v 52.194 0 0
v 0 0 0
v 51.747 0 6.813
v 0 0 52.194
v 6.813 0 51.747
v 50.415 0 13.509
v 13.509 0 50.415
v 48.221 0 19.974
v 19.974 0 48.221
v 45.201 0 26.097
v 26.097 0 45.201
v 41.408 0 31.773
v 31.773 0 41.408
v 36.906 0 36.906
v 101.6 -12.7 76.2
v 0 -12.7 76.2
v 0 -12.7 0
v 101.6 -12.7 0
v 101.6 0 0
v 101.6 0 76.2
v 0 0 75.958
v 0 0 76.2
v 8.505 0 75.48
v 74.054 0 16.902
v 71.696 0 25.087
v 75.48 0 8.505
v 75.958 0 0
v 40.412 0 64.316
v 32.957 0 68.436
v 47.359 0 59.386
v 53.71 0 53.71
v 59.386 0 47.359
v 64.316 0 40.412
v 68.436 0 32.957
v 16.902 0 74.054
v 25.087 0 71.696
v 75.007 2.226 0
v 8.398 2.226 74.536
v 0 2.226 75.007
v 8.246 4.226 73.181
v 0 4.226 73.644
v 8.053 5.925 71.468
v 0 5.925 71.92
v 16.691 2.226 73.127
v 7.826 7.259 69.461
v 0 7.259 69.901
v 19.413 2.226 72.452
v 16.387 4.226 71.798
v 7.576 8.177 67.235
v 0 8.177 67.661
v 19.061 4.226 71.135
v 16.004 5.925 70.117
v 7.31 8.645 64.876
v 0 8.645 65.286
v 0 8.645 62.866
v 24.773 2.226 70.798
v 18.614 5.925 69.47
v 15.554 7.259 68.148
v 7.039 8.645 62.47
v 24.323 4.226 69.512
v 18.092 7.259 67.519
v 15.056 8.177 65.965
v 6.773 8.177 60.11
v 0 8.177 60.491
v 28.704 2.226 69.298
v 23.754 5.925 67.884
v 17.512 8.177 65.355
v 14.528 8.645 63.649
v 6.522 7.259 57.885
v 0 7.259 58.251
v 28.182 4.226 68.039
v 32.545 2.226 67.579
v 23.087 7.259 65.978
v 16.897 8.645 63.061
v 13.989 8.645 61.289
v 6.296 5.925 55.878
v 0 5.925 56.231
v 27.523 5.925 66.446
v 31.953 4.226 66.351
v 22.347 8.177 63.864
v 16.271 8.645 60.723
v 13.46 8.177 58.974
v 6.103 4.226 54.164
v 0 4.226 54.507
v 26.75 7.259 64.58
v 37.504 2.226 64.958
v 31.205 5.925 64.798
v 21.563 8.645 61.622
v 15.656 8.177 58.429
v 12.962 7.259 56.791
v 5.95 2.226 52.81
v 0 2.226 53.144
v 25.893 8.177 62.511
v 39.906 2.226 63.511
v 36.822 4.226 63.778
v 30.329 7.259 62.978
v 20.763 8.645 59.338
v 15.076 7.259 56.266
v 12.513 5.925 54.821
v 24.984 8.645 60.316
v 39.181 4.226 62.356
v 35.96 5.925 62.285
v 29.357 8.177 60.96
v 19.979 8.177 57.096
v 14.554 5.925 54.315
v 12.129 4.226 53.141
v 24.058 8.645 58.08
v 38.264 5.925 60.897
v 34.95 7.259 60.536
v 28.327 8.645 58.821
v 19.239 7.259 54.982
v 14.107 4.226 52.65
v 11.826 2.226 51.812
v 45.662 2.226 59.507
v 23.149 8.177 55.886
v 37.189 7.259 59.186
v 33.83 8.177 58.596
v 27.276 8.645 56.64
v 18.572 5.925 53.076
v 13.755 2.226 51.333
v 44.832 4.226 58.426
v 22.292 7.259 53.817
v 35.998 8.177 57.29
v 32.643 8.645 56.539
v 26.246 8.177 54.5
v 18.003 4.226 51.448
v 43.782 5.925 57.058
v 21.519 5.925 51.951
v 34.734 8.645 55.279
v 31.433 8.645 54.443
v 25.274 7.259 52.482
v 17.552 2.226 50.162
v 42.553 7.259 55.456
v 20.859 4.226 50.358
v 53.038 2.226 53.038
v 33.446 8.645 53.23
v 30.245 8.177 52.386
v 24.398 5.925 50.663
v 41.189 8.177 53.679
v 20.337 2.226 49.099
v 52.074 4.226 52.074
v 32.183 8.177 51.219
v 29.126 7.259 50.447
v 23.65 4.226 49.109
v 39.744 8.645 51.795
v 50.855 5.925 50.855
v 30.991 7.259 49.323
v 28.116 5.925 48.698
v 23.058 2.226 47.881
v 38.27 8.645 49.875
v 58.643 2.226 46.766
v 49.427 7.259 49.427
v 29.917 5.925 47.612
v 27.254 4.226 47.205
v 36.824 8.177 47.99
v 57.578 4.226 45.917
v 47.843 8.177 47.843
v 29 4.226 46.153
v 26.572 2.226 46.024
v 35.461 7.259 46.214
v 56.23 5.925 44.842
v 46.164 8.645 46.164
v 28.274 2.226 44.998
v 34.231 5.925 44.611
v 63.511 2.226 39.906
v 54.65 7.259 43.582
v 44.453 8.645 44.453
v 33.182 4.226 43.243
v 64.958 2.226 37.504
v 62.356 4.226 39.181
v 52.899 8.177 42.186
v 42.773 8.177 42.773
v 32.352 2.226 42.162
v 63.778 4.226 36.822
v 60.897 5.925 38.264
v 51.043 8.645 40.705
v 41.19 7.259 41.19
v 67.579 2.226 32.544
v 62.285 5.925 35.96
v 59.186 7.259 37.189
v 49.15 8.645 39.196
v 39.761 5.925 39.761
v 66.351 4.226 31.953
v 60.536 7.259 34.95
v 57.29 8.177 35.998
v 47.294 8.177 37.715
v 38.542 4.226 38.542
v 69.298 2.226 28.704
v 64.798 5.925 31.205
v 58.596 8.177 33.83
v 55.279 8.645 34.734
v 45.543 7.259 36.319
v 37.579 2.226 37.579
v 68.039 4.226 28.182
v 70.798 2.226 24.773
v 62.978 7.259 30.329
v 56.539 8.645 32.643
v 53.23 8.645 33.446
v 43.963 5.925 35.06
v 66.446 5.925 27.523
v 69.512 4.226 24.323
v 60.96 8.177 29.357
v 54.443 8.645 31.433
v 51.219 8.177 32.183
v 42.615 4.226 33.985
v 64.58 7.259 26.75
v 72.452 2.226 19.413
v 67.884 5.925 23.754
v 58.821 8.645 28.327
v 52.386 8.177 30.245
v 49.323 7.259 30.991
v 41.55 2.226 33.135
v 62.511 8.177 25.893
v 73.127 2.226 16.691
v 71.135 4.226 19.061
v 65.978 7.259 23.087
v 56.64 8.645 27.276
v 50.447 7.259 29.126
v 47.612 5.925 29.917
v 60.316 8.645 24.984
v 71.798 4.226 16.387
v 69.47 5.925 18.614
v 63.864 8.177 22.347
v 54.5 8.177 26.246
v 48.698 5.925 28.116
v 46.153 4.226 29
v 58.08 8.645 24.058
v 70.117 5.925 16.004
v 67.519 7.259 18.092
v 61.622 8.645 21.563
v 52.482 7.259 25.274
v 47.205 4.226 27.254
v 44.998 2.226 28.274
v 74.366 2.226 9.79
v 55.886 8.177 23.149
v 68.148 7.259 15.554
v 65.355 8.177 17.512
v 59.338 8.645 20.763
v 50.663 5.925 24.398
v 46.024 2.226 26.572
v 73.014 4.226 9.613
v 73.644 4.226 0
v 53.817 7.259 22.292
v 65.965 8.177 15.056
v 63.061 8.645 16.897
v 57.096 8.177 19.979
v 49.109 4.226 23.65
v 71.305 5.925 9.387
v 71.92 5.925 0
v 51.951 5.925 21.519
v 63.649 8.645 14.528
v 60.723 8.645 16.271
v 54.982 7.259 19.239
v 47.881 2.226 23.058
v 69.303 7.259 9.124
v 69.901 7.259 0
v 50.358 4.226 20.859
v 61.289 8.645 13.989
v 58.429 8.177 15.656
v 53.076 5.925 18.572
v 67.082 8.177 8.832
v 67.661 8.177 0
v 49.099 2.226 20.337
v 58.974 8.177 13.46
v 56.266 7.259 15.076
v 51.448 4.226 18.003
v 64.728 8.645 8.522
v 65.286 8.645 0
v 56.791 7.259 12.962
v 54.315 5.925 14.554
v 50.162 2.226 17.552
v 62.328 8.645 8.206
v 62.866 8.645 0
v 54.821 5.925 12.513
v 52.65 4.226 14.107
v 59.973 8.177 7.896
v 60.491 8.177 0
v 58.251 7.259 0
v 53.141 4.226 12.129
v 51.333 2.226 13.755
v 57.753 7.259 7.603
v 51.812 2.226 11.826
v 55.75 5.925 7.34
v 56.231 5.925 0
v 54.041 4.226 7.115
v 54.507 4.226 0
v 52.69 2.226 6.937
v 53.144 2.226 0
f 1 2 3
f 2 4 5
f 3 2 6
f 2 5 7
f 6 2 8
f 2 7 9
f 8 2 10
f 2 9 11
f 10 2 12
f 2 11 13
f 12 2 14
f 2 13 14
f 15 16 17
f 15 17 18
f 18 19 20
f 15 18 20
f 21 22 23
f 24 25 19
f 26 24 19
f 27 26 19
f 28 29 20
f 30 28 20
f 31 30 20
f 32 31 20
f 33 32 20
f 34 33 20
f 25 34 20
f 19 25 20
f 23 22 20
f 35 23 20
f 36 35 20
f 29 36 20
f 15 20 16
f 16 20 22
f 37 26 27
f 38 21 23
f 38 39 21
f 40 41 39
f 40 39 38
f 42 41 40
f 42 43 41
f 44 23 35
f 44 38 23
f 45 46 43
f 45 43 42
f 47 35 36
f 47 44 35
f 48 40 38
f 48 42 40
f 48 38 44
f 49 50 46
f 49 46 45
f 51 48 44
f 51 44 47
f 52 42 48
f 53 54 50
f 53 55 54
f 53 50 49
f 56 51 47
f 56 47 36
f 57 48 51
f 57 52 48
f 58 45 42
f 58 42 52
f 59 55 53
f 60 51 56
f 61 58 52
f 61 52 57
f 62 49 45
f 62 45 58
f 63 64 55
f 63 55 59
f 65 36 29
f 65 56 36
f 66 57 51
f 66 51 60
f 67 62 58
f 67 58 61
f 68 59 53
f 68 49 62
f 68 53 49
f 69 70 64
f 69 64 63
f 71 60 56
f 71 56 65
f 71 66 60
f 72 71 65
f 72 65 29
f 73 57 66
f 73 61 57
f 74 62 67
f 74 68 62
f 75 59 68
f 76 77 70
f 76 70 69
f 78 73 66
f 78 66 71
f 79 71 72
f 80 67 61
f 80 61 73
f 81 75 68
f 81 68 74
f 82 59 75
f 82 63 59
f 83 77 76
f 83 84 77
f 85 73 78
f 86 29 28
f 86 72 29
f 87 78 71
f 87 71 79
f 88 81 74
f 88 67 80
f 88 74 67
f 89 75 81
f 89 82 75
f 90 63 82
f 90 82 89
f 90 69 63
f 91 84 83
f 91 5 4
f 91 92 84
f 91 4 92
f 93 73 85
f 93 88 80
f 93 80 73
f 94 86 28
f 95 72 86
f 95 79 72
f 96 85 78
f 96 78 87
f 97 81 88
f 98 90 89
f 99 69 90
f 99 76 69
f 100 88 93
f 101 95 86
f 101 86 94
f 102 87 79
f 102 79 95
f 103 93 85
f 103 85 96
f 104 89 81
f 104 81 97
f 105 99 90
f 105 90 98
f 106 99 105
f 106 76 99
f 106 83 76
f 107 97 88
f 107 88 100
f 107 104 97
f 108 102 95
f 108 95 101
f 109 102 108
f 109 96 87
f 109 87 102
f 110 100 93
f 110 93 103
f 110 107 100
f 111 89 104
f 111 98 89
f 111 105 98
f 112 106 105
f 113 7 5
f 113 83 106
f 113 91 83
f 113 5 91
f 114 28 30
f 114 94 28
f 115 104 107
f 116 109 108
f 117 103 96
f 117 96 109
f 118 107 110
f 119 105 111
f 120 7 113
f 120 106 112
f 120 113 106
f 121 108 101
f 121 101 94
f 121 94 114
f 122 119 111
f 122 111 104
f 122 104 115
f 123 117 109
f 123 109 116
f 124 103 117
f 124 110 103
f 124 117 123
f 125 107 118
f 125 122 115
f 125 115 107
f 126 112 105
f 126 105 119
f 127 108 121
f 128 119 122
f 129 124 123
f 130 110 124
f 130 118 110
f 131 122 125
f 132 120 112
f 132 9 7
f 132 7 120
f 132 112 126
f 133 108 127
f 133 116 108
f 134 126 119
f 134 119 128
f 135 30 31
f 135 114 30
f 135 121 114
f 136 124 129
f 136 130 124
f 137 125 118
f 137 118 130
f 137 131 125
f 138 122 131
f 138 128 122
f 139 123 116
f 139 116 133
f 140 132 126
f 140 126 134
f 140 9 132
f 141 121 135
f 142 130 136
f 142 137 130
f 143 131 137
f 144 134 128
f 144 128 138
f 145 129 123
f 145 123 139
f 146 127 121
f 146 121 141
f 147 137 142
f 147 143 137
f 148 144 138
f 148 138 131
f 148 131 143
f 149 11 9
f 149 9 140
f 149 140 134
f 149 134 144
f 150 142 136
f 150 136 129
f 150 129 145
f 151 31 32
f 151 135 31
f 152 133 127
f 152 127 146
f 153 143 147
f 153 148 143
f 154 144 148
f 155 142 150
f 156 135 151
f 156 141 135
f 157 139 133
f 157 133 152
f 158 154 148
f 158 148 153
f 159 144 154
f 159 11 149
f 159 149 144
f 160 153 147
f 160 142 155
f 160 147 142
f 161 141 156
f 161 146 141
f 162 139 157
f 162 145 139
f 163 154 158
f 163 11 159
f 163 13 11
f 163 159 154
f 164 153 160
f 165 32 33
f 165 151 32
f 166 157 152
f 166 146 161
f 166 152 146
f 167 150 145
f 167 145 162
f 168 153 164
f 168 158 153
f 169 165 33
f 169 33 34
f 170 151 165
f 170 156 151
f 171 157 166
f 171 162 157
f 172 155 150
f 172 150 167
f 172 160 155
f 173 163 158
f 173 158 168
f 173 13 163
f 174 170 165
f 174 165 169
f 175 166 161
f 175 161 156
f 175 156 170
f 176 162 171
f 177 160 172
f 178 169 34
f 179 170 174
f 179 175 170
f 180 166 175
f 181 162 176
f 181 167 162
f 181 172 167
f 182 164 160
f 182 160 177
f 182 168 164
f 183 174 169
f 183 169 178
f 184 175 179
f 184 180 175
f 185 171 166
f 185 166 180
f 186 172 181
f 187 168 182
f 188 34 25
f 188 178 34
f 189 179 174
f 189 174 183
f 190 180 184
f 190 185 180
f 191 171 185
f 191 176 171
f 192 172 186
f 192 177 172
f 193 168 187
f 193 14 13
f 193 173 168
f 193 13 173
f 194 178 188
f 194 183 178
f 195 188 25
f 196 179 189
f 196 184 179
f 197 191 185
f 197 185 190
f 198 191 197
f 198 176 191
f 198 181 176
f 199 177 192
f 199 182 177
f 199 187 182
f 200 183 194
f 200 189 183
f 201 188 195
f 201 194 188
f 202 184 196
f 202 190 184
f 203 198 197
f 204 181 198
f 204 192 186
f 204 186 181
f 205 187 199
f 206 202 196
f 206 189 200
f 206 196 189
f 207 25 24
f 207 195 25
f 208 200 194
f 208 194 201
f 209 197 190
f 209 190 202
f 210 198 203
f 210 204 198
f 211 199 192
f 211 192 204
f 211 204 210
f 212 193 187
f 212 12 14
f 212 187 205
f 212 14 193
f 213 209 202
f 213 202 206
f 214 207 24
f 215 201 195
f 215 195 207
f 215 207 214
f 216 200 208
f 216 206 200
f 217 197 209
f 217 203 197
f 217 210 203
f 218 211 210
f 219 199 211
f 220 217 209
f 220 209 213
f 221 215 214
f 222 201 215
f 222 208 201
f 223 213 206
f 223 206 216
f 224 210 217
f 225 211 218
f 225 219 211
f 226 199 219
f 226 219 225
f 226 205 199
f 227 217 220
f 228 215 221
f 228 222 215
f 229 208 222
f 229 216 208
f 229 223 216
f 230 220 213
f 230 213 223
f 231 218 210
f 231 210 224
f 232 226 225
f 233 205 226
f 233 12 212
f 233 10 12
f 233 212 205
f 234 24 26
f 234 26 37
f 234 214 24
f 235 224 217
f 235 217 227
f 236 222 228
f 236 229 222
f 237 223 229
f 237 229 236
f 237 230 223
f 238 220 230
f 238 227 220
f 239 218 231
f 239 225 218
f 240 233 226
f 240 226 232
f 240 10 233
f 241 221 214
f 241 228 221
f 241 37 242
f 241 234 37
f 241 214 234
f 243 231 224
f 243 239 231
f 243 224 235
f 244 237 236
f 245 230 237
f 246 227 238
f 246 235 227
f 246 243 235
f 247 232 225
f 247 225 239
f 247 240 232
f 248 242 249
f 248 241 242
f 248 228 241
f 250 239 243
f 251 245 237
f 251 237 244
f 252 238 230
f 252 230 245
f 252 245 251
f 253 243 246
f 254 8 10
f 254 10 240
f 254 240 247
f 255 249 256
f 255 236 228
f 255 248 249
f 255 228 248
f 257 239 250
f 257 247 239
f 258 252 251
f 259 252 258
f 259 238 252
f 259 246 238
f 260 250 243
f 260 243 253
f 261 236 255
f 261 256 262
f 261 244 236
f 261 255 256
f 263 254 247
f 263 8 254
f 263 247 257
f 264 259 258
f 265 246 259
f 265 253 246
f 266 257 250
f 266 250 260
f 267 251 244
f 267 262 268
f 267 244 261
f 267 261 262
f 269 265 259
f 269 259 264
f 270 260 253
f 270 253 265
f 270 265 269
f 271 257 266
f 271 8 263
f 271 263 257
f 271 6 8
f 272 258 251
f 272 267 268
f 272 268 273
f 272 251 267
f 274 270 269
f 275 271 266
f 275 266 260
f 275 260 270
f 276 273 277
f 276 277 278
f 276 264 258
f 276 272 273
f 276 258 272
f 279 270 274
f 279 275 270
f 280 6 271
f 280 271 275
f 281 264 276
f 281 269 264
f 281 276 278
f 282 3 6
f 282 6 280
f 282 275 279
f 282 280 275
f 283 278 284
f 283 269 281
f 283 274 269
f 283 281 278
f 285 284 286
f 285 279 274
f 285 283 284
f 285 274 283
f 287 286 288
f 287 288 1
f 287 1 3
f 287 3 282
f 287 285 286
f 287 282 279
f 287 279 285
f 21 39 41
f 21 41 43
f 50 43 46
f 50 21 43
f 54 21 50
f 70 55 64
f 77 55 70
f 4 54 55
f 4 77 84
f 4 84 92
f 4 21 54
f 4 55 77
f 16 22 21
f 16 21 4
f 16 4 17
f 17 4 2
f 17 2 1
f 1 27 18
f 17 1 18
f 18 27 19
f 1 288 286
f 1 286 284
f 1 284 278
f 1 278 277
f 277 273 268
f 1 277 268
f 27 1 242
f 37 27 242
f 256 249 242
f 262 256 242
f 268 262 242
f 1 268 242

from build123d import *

# Parameters (mm, degrees)
F3_DEPTH = 12.7


with BuildPart() as f2:
    # F2: sweep along a path in F0
    with BuildLine(Plane.XZ) as f2_path:
        ThreePointArc((0, 76.2), (53.881537, 53.881537), (76.2, 0))
    # F1 (on Top) → F2 (sweep)
    with BuildSketch(Plane.XY):
        with BuildLine():
            Line((52.193511, 0), (75.958066, 0))
            ThreePointArc((75.958066, 0), (64.075788, 8.704073), (52.193511, 0))
        make_face()
    sweep(path=f2_path.line)

    # F0 (on Front) → F3 (join)
    with BuildSketch(Plane.XZ):
        with BuildLine():
            Line((0, 76.2), (0, 0))
            Line((0, 0), (76.2, 0))
            ThreePointArc((76.2, 0), (53.881537, 53.881537), (0, 76.2))
        make_face()
        with BuildLine():
            ThreePointArc((0, 76.2), (53.881537, 53.881537), (76.2, 0))
            Line((76.2, 0), (101.6, 0))
            Line((101.6, 0), (101.6, 76.2))
            Line((101.6, 76.2), (0, 76.2))
        make_face()
    extrude(amount=F3_DEPTH)


solid = f2.part
